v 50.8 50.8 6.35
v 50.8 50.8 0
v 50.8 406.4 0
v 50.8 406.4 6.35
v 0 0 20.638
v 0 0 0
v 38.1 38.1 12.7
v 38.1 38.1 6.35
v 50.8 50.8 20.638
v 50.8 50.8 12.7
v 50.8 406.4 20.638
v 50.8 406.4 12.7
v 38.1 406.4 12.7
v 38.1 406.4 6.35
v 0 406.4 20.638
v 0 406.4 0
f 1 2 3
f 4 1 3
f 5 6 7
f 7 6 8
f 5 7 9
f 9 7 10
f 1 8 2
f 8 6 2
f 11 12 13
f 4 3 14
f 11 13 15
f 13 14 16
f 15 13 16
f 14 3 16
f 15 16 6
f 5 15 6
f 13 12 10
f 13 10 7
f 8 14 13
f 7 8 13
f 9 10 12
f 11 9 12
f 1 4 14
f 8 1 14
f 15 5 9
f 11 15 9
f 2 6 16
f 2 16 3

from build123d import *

# Parameters (mm, degrees)
F1_DEPTH = 20.6375
F2_W     = 12.7
F2_H     = 6.35
F3_DEPTH = 406.401


with BuildPart() as f1:
    # F0 (on Top) → F1 (new body)
    with BuildSketch(Plane.XY):
        Polygon((50.8, 406.4), (0, 406.4), (0, 0), (50.8, 50.8), align=None)
    extrude(amount=F1_DEPTH)

    # F2 (on face) → F3 (cut, through all)
    with BuildSketch(Plane(origin=(0, 406.4, 0), x_dir=(-1, 0, 0), z_dir=(0, 1, 0))):
        with Locations((-44.45, 9.525)):
            Rectangle(F2_W, F2_H)
    extrude(amount=-F3_DEPTH, mode=Mode.SUBTRACT)


solid = f1.part
